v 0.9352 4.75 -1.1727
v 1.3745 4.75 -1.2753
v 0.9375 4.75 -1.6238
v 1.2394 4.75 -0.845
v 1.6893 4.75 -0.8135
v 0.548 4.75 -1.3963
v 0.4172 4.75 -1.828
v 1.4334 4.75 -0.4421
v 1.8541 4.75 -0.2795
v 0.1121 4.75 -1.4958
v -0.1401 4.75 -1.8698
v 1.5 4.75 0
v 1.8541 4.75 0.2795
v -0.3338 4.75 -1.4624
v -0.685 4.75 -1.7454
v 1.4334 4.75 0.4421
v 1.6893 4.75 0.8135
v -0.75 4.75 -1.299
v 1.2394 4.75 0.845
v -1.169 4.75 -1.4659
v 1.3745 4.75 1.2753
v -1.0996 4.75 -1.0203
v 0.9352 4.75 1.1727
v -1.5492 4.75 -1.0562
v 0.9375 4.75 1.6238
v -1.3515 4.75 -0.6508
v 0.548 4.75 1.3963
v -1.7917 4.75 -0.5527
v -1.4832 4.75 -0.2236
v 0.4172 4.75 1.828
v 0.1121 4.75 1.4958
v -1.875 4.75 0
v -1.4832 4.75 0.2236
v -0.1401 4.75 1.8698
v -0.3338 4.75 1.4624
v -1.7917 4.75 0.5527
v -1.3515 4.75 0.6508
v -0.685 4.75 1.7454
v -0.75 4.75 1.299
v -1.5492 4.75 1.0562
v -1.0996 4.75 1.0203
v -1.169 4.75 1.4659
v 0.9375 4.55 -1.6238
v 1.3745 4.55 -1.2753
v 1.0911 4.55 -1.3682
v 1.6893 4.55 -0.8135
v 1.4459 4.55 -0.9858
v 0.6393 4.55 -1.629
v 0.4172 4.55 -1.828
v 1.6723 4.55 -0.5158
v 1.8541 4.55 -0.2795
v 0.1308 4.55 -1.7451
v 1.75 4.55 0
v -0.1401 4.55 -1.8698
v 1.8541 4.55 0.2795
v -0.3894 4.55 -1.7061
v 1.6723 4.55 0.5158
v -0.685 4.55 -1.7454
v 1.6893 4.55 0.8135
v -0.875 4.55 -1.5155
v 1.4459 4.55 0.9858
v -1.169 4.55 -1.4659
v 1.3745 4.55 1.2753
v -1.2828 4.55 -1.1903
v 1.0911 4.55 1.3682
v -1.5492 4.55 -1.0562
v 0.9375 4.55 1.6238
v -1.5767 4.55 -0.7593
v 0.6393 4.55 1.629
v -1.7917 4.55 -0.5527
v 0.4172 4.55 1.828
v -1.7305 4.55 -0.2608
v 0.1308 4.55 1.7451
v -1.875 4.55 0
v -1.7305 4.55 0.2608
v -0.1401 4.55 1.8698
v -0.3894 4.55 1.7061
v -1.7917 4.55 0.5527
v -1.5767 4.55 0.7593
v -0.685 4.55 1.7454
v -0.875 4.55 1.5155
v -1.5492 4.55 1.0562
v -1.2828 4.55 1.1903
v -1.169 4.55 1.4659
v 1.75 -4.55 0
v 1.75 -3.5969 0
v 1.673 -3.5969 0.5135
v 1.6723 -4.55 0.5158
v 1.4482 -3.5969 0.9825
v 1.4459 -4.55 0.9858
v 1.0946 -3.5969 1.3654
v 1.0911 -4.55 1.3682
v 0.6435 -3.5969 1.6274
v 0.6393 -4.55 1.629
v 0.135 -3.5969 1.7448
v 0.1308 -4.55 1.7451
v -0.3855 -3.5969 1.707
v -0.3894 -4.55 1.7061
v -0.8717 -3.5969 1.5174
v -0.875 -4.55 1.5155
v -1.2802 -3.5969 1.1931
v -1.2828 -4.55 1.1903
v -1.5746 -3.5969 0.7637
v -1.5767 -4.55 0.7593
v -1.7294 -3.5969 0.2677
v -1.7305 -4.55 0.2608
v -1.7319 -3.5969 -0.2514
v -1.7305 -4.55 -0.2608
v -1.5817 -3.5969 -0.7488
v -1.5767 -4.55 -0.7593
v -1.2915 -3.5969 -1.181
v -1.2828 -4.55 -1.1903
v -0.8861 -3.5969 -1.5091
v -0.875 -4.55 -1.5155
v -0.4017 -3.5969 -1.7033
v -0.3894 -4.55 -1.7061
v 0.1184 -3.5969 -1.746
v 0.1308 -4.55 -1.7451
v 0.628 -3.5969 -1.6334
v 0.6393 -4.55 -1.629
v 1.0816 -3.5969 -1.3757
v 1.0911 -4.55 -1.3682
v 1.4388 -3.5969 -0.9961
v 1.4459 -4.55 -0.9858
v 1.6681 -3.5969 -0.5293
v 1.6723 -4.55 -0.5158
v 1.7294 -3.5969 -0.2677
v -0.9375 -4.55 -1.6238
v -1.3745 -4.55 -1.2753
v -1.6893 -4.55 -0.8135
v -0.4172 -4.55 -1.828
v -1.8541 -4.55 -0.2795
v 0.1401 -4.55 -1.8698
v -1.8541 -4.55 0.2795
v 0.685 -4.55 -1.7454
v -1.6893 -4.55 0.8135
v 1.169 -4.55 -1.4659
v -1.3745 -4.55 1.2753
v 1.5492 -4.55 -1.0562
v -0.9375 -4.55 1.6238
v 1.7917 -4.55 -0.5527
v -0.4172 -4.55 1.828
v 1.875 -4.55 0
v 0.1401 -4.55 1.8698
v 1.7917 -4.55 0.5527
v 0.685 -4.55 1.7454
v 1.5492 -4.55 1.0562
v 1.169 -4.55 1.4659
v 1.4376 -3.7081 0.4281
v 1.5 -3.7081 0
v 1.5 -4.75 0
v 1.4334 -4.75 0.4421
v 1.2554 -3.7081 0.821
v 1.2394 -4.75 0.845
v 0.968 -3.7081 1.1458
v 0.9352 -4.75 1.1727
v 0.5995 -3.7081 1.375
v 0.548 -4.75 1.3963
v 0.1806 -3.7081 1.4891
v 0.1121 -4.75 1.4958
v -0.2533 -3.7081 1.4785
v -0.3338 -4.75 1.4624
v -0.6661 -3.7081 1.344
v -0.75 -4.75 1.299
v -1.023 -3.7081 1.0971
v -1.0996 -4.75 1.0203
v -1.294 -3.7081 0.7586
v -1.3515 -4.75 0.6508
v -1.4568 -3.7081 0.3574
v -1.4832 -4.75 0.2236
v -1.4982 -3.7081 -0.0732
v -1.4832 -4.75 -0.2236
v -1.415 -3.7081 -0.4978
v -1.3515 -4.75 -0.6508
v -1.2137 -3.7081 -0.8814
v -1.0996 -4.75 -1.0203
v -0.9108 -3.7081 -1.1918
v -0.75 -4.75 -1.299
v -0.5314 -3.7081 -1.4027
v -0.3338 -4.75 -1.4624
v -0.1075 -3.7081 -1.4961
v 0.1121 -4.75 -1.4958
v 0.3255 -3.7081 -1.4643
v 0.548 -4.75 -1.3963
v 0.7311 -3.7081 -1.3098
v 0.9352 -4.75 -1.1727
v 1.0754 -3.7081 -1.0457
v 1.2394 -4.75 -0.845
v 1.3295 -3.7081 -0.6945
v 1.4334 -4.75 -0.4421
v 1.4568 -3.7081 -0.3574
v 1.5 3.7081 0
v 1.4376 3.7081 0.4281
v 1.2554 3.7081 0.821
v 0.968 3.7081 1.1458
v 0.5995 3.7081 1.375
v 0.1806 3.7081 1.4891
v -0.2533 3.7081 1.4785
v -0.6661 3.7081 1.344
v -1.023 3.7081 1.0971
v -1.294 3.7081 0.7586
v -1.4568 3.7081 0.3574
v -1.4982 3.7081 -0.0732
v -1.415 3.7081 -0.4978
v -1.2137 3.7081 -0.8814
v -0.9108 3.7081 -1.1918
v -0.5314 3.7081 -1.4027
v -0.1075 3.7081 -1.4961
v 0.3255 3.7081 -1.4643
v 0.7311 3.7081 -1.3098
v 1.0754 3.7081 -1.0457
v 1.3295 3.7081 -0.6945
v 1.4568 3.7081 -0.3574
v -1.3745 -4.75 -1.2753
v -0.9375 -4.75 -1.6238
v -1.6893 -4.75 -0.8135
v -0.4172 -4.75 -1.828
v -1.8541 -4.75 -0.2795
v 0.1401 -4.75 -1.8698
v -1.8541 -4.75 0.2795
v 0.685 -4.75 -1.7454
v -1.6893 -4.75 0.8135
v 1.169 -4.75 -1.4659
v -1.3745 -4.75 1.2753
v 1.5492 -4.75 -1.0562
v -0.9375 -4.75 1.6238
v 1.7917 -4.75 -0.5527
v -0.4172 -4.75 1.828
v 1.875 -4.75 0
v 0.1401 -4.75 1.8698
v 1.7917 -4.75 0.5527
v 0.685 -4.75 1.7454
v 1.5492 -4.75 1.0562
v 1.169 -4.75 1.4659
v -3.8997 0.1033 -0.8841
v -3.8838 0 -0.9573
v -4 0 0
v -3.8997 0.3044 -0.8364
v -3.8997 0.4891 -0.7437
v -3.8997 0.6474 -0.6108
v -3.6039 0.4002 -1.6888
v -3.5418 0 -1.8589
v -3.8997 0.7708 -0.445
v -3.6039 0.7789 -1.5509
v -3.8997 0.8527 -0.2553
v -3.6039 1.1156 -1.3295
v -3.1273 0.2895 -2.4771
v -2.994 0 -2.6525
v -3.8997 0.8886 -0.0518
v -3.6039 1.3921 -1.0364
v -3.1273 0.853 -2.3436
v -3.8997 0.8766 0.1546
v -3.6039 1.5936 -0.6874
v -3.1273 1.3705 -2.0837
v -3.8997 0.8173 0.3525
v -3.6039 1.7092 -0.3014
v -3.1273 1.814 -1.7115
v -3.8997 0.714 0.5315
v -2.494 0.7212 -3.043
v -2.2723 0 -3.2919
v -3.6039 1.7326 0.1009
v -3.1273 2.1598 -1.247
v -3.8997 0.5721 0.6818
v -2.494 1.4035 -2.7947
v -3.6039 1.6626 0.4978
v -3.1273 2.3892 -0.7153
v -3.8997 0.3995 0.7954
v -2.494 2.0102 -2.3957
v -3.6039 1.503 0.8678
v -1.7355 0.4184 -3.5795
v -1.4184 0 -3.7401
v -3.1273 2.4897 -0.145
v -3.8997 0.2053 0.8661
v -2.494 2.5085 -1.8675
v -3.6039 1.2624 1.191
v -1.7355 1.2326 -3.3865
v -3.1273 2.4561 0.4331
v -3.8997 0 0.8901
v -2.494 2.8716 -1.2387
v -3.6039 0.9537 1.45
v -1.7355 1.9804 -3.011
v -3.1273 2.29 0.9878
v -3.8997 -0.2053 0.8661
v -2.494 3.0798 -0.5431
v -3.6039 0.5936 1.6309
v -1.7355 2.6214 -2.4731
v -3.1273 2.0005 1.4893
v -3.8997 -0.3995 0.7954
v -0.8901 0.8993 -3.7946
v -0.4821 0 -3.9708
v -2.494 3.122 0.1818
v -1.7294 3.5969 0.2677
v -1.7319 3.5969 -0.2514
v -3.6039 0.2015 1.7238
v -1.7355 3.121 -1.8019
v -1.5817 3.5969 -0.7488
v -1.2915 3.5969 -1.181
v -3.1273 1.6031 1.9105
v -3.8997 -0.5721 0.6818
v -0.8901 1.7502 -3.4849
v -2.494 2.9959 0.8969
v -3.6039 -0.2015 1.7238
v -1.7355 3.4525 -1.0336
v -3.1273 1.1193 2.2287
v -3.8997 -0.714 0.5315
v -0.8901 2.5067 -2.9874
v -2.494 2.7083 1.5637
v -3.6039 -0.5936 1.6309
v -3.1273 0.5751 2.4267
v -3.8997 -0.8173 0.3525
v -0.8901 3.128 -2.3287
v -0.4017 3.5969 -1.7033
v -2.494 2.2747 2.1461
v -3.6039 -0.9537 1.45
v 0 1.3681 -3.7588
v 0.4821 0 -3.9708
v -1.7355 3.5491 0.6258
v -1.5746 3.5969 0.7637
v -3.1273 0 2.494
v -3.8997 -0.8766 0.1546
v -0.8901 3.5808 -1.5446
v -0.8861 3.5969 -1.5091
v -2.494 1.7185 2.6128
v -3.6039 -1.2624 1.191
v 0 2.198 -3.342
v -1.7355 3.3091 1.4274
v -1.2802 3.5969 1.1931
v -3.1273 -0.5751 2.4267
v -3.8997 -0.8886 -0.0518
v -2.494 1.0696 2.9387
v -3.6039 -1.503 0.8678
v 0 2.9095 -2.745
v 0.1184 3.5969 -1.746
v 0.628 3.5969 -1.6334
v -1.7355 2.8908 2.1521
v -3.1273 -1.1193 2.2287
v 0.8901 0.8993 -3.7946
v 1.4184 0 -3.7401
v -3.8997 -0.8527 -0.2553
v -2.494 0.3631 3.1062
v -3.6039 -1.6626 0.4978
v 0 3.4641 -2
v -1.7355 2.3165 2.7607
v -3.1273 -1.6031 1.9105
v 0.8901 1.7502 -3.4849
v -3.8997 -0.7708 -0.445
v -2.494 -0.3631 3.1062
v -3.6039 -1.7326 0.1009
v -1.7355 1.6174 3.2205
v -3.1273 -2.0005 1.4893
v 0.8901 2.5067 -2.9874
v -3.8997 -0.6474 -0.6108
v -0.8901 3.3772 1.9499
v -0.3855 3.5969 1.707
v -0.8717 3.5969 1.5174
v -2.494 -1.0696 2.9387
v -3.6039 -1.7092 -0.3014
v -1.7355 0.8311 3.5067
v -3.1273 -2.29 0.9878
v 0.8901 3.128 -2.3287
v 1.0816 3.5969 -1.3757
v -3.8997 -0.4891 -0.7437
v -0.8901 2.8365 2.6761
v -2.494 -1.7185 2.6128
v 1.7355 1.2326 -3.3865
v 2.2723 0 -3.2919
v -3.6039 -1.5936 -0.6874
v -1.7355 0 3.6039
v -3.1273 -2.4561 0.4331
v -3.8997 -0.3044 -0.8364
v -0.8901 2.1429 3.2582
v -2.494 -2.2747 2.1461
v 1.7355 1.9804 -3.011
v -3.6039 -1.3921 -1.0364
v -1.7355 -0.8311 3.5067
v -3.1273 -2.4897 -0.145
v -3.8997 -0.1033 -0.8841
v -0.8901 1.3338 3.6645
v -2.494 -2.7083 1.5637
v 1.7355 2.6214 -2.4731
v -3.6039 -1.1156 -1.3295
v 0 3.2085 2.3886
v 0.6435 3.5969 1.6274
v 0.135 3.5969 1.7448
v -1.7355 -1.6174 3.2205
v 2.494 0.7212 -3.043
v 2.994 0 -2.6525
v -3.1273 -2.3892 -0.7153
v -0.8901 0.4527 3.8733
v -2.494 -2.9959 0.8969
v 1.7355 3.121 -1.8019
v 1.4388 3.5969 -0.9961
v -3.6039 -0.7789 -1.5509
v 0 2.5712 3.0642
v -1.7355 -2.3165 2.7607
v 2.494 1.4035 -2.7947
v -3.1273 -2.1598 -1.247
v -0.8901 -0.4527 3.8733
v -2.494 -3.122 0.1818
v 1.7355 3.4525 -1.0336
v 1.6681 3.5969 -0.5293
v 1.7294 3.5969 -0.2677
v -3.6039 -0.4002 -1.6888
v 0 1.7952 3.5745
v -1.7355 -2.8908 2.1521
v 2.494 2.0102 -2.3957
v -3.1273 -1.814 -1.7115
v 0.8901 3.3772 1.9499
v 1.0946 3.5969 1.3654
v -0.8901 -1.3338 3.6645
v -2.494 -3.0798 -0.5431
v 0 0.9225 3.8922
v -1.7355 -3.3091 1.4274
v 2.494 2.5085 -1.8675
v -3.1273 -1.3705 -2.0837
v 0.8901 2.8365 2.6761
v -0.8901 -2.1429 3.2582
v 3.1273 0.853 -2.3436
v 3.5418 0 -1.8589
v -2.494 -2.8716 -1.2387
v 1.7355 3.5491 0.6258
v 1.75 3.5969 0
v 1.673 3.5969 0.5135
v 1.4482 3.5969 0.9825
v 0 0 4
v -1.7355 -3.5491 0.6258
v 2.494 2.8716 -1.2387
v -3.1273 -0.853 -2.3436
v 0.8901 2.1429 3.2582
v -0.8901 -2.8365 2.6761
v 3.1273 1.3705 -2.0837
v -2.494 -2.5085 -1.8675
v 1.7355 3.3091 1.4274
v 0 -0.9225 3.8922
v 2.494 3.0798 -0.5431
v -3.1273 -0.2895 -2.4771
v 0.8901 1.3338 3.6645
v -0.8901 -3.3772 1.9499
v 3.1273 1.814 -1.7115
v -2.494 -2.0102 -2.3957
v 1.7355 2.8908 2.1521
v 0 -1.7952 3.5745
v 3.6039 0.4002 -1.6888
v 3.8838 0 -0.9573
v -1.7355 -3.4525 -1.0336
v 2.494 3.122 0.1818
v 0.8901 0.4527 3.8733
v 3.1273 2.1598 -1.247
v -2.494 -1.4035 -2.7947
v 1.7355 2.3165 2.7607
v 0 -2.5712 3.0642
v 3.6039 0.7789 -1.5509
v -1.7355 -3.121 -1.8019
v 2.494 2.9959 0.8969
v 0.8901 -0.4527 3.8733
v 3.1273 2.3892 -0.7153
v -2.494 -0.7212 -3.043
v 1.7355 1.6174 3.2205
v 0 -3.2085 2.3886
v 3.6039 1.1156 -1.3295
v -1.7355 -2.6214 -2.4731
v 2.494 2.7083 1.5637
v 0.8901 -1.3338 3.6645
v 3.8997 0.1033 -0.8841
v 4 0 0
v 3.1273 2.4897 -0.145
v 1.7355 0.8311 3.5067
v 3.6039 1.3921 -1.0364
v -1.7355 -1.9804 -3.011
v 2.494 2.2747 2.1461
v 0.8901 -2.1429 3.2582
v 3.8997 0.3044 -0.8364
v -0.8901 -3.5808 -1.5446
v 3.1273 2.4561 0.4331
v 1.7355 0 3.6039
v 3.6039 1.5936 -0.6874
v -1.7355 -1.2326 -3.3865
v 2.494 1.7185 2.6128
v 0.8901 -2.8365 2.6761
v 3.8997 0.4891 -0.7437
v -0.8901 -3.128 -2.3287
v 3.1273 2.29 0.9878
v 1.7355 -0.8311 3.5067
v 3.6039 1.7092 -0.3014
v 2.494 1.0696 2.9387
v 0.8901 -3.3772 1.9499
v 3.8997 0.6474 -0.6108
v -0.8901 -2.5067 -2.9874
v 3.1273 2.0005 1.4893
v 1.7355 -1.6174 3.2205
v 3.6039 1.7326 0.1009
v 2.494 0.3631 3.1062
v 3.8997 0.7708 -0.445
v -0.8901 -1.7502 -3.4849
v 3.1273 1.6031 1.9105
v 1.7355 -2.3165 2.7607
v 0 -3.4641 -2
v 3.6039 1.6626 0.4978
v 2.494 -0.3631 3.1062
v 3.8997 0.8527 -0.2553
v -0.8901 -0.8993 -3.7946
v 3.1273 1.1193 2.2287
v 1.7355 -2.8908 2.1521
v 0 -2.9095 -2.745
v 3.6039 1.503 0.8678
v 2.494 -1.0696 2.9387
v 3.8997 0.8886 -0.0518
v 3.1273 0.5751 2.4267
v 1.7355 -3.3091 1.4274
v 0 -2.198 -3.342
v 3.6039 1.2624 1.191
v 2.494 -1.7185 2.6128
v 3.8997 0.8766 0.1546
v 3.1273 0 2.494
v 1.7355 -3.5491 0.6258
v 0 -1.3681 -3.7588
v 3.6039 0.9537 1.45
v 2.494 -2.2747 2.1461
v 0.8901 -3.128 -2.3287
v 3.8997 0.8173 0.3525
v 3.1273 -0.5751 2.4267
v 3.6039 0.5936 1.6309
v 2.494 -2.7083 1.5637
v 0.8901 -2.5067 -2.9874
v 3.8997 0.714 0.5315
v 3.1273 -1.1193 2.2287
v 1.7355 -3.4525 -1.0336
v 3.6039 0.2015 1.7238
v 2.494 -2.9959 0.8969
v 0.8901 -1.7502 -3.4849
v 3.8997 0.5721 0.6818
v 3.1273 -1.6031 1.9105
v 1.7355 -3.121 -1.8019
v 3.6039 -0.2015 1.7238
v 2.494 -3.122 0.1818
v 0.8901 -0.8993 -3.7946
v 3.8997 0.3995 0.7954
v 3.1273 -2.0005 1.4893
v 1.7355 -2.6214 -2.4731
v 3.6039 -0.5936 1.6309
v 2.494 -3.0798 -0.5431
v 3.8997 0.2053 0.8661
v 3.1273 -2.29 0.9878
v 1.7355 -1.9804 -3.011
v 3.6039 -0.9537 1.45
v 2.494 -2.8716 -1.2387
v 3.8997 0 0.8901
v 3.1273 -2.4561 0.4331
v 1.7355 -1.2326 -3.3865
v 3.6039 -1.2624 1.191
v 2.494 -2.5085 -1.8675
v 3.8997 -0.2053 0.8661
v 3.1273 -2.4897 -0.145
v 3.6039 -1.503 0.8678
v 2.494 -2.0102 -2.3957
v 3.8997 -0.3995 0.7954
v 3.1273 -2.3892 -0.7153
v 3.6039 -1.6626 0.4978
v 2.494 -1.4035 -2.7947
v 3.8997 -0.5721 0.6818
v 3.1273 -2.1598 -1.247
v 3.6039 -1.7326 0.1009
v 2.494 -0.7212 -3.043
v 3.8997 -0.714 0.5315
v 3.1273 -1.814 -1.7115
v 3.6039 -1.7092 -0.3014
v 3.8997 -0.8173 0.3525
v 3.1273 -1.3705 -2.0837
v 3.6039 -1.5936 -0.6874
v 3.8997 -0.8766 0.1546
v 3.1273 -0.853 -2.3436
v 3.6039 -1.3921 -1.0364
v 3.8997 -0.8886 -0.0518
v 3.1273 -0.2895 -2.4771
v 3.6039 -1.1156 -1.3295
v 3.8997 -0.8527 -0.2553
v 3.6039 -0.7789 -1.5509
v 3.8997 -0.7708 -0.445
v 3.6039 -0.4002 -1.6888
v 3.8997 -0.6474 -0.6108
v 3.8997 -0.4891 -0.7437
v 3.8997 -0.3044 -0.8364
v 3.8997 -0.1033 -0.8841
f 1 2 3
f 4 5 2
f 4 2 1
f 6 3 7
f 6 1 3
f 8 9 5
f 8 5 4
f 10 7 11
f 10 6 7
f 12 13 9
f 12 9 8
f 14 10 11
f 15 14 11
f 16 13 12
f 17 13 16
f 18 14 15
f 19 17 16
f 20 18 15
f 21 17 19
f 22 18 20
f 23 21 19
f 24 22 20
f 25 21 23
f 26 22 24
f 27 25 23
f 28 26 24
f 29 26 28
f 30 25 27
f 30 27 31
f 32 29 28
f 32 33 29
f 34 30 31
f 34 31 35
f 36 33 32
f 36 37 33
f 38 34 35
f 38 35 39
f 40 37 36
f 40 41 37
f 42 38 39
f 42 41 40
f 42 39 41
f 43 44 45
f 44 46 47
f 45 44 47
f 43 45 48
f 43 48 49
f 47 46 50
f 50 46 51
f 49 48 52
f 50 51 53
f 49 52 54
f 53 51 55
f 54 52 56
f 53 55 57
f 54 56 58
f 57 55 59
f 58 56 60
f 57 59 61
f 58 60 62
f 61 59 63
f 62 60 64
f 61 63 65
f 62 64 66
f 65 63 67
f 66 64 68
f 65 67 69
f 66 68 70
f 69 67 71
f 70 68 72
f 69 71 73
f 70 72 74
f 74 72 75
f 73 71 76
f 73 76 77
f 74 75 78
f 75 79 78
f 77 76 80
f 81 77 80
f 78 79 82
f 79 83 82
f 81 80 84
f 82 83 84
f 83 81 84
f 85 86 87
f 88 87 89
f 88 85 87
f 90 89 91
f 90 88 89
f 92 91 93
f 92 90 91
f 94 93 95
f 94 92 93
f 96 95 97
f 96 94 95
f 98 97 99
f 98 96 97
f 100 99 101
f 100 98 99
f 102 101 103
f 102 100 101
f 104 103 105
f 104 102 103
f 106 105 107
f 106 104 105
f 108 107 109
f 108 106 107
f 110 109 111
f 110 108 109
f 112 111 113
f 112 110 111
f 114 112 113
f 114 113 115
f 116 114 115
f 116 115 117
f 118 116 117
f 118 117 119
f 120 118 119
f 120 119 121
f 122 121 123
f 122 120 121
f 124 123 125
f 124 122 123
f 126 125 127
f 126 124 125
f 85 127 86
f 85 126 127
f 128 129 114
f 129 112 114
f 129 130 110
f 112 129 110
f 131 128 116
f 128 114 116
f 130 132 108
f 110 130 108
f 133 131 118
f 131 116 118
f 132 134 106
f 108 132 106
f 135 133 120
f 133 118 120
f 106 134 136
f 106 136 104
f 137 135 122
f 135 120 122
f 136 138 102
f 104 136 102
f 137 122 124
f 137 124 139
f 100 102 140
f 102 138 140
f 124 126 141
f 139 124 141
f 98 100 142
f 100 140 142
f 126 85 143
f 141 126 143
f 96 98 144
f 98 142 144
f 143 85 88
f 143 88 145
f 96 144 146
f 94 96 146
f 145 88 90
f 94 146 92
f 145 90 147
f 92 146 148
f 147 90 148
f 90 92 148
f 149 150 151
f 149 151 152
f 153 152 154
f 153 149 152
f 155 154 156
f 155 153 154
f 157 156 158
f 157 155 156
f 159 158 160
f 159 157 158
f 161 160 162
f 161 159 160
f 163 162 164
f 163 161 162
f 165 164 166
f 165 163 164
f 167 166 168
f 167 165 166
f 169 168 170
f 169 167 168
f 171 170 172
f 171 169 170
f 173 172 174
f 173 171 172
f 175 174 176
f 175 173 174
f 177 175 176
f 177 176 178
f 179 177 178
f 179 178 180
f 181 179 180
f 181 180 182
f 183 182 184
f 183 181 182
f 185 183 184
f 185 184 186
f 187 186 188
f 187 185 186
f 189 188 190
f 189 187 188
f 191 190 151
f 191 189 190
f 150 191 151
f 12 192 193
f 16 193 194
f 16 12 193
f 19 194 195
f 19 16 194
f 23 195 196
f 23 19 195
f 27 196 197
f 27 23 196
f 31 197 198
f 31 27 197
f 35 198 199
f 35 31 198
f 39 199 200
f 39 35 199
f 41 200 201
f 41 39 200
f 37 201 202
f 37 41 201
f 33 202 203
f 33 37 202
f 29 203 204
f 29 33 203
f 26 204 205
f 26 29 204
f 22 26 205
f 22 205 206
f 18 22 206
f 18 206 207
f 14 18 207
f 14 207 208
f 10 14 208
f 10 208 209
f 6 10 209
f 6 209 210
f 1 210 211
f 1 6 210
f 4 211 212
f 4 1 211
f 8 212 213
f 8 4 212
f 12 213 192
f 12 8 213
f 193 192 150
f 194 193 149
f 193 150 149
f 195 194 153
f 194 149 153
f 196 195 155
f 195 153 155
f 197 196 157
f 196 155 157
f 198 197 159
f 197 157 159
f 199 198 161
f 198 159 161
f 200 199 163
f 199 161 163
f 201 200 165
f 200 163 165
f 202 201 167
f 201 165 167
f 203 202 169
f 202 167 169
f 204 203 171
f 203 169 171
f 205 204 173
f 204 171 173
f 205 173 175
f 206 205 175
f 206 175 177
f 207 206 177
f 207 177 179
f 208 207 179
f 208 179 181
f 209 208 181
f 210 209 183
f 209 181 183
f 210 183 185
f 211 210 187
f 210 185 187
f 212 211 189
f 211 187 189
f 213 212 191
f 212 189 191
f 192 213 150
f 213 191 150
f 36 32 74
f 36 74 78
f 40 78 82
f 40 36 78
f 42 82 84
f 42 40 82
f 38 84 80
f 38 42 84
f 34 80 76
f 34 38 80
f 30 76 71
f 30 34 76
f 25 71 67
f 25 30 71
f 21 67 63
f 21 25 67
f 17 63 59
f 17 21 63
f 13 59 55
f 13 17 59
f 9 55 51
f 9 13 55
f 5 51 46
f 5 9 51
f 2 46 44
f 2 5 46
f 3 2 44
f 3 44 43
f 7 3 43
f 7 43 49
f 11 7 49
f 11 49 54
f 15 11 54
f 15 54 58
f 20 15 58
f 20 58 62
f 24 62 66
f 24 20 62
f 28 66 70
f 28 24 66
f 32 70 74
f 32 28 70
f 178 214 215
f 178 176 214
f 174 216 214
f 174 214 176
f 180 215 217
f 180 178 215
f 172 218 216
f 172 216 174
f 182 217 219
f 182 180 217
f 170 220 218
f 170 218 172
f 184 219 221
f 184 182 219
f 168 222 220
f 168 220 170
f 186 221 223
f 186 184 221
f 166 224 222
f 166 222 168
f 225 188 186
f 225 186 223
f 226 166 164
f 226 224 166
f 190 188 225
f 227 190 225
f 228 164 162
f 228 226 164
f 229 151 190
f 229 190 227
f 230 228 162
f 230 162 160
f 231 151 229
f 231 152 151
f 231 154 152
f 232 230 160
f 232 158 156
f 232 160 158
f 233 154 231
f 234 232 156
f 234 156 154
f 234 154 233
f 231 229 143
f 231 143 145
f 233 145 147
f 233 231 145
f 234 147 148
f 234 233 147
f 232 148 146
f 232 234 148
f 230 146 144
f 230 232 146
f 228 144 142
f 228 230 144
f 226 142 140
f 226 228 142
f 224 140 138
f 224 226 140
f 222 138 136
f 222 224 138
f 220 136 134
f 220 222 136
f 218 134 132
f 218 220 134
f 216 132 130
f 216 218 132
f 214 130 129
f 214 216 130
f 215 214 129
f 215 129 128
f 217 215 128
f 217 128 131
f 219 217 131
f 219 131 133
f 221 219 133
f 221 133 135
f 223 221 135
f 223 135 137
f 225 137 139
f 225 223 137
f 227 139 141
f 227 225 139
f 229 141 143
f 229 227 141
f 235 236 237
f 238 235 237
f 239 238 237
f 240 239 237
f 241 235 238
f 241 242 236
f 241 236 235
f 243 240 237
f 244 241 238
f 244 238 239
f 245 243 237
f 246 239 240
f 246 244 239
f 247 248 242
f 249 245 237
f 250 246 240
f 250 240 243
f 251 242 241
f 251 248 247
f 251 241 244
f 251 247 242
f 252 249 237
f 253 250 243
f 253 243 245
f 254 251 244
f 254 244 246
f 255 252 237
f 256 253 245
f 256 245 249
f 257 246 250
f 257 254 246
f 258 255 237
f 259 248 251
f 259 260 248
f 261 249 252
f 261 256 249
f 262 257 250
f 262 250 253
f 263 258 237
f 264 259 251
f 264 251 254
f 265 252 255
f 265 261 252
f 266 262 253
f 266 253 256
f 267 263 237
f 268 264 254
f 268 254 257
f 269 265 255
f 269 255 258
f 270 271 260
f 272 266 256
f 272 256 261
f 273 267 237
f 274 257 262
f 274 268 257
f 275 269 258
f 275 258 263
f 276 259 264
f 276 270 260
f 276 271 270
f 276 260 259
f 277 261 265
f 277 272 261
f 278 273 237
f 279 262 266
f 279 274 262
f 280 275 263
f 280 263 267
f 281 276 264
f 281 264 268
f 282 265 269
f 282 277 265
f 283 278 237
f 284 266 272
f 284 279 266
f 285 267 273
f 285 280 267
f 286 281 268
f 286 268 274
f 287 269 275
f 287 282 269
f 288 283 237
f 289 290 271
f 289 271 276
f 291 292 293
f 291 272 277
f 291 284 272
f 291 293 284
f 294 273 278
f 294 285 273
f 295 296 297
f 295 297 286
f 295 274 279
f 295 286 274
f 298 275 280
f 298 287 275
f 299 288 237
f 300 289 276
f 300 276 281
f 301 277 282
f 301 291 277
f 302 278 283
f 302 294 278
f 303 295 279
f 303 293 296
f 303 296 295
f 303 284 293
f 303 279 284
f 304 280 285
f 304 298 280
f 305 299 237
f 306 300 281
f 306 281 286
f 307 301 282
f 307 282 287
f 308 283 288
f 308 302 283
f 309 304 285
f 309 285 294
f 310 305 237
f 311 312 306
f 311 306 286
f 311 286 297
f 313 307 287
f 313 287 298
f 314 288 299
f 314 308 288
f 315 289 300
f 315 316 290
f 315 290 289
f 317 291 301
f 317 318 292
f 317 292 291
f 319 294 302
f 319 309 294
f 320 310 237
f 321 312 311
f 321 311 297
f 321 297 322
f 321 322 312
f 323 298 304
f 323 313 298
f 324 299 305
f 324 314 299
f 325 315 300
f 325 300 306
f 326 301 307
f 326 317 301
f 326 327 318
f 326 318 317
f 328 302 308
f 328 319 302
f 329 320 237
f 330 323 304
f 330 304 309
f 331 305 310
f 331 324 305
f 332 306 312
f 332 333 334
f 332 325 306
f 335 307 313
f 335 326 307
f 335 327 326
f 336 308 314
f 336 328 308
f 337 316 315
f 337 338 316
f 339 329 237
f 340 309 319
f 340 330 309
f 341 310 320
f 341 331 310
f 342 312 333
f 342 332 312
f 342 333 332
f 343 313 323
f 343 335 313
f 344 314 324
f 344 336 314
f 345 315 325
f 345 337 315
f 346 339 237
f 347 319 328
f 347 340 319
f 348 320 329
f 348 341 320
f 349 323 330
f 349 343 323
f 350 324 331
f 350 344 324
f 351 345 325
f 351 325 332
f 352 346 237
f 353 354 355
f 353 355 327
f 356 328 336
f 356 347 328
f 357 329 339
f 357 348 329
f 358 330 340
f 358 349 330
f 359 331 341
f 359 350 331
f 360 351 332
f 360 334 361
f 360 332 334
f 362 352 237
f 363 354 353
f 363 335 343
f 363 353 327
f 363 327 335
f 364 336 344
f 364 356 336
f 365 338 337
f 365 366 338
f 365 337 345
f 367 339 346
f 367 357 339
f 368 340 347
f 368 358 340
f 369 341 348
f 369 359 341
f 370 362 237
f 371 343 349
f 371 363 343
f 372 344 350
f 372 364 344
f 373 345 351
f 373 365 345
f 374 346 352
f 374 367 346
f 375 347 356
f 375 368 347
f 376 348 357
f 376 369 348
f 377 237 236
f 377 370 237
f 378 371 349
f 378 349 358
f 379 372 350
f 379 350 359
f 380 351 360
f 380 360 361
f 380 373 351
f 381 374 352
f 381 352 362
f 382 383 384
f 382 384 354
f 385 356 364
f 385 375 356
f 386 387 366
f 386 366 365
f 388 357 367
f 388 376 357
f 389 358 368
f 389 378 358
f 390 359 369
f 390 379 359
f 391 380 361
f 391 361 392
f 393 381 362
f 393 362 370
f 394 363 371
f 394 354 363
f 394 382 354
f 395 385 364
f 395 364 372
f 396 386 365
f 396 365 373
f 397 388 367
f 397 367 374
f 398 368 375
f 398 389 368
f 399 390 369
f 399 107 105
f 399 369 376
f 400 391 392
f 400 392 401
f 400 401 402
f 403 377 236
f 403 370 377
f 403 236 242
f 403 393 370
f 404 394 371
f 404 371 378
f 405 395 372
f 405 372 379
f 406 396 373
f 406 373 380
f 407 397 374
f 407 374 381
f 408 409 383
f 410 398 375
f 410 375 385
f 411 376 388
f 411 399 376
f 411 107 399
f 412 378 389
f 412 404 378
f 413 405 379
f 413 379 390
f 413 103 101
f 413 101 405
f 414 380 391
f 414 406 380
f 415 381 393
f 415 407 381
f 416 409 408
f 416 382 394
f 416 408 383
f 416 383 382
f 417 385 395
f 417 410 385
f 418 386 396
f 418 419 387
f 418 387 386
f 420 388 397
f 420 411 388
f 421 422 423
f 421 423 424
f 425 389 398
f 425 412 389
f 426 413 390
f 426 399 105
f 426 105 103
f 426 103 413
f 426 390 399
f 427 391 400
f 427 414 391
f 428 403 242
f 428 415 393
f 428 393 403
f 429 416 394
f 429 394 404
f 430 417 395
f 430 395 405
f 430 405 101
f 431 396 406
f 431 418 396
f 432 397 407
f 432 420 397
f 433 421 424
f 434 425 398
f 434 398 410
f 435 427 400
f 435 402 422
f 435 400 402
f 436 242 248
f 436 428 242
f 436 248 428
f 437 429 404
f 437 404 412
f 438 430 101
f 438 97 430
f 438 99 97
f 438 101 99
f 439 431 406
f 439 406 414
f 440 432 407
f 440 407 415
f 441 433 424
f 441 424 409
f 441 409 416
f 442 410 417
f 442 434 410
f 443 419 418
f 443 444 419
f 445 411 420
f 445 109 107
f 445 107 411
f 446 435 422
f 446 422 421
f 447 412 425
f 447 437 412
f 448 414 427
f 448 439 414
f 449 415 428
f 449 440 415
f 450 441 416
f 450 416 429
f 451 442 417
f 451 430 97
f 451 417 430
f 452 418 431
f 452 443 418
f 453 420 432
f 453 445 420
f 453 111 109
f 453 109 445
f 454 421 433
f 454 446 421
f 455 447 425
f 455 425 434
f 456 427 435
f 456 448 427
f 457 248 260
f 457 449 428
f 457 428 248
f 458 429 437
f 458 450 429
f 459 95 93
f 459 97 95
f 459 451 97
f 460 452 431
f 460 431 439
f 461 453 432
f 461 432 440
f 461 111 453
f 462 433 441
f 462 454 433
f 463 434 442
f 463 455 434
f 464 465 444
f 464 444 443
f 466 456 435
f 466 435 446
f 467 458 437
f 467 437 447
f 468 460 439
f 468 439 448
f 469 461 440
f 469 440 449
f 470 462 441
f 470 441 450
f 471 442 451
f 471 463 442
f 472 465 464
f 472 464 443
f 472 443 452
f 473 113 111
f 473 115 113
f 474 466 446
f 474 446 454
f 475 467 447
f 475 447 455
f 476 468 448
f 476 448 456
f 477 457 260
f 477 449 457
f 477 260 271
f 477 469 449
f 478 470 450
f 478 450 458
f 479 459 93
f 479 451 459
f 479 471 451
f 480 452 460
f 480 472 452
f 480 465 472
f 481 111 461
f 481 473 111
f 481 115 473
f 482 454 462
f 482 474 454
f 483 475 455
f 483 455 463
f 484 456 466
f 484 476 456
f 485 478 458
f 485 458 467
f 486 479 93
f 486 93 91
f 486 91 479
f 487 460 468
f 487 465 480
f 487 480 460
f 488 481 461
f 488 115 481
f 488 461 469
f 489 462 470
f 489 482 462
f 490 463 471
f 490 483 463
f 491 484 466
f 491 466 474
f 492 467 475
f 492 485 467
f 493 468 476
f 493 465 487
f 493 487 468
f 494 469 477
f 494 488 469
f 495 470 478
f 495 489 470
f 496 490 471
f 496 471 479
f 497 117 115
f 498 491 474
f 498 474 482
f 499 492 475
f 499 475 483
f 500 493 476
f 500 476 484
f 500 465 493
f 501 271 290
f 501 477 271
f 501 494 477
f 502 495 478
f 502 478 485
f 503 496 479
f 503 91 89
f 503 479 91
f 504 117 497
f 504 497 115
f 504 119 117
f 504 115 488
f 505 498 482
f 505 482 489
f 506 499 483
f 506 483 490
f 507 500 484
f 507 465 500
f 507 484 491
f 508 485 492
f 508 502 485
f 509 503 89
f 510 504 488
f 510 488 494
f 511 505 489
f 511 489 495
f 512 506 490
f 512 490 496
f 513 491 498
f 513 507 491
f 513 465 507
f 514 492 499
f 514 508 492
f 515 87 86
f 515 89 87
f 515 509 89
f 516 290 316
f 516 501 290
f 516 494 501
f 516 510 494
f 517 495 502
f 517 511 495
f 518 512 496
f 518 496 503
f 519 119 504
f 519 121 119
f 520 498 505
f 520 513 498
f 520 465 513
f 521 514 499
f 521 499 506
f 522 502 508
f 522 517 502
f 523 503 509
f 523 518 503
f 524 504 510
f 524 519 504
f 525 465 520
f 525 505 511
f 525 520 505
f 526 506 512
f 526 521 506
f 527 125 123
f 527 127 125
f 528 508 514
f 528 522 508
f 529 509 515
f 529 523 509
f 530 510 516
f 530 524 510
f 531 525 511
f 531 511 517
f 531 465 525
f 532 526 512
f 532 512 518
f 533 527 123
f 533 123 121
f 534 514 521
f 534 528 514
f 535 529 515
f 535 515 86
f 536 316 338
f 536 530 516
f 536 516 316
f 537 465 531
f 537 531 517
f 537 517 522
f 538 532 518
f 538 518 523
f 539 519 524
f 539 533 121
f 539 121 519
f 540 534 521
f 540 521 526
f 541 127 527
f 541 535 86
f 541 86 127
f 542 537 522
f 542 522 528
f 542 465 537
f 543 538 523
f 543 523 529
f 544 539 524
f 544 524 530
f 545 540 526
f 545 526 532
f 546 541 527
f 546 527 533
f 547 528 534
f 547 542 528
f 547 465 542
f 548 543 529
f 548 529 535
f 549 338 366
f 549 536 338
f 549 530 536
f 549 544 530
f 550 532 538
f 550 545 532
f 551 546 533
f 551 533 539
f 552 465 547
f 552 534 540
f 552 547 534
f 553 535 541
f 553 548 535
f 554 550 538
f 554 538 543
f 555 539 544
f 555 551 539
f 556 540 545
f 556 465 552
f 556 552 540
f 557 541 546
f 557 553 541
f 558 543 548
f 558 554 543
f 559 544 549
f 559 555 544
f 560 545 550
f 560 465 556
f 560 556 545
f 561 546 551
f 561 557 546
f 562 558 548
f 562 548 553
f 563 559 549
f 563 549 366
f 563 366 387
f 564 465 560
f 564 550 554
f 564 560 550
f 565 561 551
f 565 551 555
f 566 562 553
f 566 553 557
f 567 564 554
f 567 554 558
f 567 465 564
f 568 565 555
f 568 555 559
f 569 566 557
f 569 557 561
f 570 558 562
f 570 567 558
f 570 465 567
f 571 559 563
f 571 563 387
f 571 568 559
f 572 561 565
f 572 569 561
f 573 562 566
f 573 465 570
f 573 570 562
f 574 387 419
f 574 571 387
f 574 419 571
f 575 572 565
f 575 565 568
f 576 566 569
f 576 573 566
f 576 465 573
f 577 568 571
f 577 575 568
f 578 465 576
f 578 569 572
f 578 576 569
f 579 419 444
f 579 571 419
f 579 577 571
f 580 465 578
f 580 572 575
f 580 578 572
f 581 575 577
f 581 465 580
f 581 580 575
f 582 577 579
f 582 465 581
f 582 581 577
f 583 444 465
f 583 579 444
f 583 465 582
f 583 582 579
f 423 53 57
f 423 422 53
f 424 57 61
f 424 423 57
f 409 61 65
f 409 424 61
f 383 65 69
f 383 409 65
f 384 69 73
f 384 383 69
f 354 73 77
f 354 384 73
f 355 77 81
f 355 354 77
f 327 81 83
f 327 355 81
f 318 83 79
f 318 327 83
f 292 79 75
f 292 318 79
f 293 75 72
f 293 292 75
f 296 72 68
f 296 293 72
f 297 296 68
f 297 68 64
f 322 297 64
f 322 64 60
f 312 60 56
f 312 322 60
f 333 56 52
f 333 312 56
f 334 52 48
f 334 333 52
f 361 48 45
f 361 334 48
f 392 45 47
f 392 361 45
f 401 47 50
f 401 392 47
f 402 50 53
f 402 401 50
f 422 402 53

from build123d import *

# Parameters (mm, degrees)
F2_R     = 1.5
F3_DEPTH = 12.5
F2_R_2   = 1.75
F4_DEPTH = 4.75
F5_R     = 1.875
F5_R_2   = 1.75
F6_DEPTH = 0.2
F7_R     = 1.875
F7_R_2   = 1.75
F8_DEPTH = 0.2


with BuildPart() as f1:
    # F0 (on Front) → F1 (revolve)
    with BuildSketch(Plane.XZ):
        with BuildLine():
            ThreePointArc((-4, 0), (0, -4), (4, 0))
            Line((4, 0), (-4, 0))
        make_face()
    revolve(axis=Axis((3.253754, 0, 0), (1, 0, 0)))

    # F2 (on Front) → F3 (cut, symmetric)
    with BuildSketch(Plane.XZ):
        Circle(F2_R)
    extrude(amount=F3_DEPTH, both=True, mode=Mode.SUBTRACT)

    # F2 (on Front) → F4 (join, symmetric)
    with BuildSketch(Plane.XZ):
        Circle(F2_R_2)
        Circle(F2_R, mode=Mode.SUBTRACT)
    extrude(amount=F4_DEPTH, both=True)

    # F5 (on face) → F6 (join)
    with BuildSketch(Plane.XZ.offset(4.75)):
        Circle(F5_R)
        Circle(F5_R_2, mode=Mode.SUBTRACT)
    extrude(amount=-F6_DEPTH)

    # F7 (on face) → F8 (join)
    with BuildSketch(Plane(origin=(0, 4.75, 0), x_dir=(-1, 0, 0), z_dir=(0, 1, 0))):
        Circle(F7_R)
        Circle(F7_R_2, mode=Mode.SUBTRACT)
    extrude(amount=-F8_DEPTH)


solid = f1.part
